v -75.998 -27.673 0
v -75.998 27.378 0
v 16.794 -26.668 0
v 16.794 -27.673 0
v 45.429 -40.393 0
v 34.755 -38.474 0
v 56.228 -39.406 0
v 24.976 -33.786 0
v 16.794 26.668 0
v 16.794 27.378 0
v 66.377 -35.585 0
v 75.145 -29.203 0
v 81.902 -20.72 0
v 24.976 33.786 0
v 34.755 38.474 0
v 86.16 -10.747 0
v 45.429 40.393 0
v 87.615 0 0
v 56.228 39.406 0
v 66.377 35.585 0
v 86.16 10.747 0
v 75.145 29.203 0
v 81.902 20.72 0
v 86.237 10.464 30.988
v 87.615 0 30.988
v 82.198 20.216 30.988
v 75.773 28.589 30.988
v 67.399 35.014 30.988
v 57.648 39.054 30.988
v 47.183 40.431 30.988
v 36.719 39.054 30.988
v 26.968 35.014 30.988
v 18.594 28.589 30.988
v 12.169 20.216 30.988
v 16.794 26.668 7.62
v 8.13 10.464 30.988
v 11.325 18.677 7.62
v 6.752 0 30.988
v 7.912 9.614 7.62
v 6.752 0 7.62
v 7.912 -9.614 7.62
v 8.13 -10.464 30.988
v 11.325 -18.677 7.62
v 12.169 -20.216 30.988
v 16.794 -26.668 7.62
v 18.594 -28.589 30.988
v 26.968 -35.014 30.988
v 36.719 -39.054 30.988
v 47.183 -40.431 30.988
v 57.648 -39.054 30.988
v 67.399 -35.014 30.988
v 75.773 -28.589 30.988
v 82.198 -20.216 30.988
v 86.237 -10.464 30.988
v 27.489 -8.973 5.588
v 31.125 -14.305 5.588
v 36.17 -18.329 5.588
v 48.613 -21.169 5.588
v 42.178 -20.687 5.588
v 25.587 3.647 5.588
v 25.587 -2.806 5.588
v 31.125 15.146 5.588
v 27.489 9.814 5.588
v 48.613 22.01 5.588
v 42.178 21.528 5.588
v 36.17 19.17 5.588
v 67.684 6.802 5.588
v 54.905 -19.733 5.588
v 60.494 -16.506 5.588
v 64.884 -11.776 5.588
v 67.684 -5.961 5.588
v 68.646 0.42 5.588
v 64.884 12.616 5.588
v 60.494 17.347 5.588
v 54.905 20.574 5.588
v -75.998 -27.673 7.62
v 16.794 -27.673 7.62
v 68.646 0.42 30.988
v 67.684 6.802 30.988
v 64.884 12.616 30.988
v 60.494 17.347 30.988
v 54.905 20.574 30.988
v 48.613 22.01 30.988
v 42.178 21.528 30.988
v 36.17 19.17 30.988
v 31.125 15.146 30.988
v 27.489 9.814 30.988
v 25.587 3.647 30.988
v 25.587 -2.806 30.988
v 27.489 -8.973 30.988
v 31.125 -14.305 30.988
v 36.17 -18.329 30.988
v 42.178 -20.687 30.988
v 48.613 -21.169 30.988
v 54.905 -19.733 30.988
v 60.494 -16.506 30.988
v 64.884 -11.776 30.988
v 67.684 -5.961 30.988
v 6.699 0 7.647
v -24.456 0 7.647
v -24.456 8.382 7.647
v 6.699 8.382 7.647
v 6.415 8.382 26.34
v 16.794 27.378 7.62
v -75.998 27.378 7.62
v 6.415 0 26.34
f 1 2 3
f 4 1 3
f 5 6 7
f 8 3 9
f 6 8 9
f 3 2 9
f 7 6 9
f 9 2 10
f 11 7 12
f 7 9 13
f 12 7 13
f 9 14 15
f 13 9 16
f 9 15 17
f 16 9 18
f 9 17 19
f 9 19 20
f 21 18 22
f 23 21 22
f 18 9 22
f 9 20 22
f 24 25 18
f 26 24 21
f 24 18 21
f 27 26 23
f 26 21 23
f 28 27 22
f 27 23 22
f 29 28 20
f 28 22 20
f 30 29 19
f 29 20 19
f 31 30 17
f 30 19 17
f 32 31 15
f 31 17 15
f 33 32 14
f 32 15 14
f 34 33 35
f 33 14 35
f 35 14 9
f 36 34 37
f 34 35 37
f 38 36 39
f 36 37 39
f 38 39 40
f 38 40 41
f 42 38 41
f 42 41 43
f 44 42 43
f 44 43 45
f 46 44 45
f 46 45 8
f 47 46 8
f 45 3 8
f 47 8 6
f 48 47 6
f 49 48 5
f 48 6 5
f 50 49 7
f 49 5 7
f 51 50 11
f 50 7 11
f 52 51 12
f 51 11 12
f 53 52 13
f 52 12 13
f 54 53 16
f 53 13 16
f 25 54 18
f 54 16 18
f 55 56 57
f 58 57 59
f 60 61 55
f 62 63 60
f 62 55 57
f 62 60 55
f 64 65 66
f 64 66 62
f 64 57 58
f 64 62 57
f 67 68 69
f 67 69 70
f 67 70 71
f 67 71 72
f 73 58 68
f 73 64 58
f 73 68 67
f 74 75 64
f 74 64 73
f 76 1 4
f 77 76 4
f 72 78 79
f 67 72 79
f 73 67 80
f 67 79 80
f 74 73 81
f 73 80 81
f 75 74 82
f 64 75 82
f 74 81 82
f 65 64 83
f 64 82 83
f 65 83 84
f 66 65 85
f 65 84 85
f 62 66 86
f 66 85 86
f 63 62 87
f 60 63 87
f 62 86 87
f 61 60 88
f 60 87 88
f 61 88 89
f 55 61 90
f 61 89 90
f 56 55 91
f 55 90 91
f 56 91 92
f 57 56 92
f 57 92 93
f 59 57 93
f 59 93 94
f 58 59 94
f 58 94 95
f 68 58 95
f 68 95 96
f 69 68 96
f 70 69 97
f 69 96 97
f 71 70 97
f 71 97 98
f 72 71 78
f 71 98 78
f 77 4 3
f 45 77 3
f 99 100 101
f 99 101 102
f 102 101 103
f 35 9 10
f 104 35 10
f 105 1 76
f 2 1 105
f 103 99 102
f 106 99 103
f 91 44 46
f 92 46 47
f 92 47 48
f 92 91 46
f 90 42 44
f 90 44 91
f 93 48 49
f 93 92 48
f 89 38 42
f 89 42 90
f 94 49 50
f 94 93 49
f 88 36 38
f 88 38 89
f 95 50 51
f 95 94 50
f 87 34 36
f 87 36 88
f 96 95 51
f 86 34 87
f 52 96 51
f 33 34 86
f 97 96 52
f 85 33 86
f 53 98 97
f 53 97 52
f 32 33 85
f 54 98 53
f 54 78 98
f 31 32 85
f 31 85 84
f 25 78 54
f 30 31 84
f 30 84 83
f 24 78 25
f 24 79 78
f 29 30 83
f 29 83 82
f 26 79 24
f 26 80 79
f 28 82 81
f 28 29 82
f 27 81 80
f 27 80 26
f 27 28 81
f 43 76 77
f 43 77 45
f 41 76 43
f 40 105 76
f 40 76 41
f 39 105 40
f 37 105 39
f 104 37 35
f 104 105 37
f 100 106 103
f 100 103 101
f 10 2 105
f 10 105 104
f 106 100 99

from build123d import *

# Parameters (mm, degrees)
F0_R     = 40.431193
F1_DEPTH = 30.988
F2_W     = 92.792079
F2_H     = 55.050961
F3_DEPTH = 7.62
F4_R     = 21.650202
F5_DEPTH = 25.4
F7_DEPTH = 8.382


with BuildPart() as f1:
    # F0 (on Top) → F1 (new body)
    with BuildSketch(Plane.XY):
        with Locations((47.183454, 0)):
            Circle(F0_R)
    extrude(amount=F1_DEPTH)

    # F2 (on Top) → F3 (join)
    with BuildSketch(Plane.XY):
        with Locations((-29.601619, -0.147059)):
            Rectangle(F2_W, F2_H)
    extrude(amount=F3_DEPTH)

    # F4 (on face) → F5 (cut)
    with BuildSketch(Plane.XY.offset(30.988)):
        with Locations((46.995543, 0.420476)):
            Circle(F4_R)
    extrude(amount=-F5_DEPTH, mode=Mode.SUBTRACT)


with BuildPart() as f7:
    # F6 (on Front) → F7 (new body)
    with BuildSketch(Plane.XZ):
        Polygon((6.698596, 7.646974), (6.415375, 26.339576), (-24.455739, 7.646974), align=None)
    extrude(amount=-F7_DEPTH)


solid = Compound([f1.part, f7.part])
